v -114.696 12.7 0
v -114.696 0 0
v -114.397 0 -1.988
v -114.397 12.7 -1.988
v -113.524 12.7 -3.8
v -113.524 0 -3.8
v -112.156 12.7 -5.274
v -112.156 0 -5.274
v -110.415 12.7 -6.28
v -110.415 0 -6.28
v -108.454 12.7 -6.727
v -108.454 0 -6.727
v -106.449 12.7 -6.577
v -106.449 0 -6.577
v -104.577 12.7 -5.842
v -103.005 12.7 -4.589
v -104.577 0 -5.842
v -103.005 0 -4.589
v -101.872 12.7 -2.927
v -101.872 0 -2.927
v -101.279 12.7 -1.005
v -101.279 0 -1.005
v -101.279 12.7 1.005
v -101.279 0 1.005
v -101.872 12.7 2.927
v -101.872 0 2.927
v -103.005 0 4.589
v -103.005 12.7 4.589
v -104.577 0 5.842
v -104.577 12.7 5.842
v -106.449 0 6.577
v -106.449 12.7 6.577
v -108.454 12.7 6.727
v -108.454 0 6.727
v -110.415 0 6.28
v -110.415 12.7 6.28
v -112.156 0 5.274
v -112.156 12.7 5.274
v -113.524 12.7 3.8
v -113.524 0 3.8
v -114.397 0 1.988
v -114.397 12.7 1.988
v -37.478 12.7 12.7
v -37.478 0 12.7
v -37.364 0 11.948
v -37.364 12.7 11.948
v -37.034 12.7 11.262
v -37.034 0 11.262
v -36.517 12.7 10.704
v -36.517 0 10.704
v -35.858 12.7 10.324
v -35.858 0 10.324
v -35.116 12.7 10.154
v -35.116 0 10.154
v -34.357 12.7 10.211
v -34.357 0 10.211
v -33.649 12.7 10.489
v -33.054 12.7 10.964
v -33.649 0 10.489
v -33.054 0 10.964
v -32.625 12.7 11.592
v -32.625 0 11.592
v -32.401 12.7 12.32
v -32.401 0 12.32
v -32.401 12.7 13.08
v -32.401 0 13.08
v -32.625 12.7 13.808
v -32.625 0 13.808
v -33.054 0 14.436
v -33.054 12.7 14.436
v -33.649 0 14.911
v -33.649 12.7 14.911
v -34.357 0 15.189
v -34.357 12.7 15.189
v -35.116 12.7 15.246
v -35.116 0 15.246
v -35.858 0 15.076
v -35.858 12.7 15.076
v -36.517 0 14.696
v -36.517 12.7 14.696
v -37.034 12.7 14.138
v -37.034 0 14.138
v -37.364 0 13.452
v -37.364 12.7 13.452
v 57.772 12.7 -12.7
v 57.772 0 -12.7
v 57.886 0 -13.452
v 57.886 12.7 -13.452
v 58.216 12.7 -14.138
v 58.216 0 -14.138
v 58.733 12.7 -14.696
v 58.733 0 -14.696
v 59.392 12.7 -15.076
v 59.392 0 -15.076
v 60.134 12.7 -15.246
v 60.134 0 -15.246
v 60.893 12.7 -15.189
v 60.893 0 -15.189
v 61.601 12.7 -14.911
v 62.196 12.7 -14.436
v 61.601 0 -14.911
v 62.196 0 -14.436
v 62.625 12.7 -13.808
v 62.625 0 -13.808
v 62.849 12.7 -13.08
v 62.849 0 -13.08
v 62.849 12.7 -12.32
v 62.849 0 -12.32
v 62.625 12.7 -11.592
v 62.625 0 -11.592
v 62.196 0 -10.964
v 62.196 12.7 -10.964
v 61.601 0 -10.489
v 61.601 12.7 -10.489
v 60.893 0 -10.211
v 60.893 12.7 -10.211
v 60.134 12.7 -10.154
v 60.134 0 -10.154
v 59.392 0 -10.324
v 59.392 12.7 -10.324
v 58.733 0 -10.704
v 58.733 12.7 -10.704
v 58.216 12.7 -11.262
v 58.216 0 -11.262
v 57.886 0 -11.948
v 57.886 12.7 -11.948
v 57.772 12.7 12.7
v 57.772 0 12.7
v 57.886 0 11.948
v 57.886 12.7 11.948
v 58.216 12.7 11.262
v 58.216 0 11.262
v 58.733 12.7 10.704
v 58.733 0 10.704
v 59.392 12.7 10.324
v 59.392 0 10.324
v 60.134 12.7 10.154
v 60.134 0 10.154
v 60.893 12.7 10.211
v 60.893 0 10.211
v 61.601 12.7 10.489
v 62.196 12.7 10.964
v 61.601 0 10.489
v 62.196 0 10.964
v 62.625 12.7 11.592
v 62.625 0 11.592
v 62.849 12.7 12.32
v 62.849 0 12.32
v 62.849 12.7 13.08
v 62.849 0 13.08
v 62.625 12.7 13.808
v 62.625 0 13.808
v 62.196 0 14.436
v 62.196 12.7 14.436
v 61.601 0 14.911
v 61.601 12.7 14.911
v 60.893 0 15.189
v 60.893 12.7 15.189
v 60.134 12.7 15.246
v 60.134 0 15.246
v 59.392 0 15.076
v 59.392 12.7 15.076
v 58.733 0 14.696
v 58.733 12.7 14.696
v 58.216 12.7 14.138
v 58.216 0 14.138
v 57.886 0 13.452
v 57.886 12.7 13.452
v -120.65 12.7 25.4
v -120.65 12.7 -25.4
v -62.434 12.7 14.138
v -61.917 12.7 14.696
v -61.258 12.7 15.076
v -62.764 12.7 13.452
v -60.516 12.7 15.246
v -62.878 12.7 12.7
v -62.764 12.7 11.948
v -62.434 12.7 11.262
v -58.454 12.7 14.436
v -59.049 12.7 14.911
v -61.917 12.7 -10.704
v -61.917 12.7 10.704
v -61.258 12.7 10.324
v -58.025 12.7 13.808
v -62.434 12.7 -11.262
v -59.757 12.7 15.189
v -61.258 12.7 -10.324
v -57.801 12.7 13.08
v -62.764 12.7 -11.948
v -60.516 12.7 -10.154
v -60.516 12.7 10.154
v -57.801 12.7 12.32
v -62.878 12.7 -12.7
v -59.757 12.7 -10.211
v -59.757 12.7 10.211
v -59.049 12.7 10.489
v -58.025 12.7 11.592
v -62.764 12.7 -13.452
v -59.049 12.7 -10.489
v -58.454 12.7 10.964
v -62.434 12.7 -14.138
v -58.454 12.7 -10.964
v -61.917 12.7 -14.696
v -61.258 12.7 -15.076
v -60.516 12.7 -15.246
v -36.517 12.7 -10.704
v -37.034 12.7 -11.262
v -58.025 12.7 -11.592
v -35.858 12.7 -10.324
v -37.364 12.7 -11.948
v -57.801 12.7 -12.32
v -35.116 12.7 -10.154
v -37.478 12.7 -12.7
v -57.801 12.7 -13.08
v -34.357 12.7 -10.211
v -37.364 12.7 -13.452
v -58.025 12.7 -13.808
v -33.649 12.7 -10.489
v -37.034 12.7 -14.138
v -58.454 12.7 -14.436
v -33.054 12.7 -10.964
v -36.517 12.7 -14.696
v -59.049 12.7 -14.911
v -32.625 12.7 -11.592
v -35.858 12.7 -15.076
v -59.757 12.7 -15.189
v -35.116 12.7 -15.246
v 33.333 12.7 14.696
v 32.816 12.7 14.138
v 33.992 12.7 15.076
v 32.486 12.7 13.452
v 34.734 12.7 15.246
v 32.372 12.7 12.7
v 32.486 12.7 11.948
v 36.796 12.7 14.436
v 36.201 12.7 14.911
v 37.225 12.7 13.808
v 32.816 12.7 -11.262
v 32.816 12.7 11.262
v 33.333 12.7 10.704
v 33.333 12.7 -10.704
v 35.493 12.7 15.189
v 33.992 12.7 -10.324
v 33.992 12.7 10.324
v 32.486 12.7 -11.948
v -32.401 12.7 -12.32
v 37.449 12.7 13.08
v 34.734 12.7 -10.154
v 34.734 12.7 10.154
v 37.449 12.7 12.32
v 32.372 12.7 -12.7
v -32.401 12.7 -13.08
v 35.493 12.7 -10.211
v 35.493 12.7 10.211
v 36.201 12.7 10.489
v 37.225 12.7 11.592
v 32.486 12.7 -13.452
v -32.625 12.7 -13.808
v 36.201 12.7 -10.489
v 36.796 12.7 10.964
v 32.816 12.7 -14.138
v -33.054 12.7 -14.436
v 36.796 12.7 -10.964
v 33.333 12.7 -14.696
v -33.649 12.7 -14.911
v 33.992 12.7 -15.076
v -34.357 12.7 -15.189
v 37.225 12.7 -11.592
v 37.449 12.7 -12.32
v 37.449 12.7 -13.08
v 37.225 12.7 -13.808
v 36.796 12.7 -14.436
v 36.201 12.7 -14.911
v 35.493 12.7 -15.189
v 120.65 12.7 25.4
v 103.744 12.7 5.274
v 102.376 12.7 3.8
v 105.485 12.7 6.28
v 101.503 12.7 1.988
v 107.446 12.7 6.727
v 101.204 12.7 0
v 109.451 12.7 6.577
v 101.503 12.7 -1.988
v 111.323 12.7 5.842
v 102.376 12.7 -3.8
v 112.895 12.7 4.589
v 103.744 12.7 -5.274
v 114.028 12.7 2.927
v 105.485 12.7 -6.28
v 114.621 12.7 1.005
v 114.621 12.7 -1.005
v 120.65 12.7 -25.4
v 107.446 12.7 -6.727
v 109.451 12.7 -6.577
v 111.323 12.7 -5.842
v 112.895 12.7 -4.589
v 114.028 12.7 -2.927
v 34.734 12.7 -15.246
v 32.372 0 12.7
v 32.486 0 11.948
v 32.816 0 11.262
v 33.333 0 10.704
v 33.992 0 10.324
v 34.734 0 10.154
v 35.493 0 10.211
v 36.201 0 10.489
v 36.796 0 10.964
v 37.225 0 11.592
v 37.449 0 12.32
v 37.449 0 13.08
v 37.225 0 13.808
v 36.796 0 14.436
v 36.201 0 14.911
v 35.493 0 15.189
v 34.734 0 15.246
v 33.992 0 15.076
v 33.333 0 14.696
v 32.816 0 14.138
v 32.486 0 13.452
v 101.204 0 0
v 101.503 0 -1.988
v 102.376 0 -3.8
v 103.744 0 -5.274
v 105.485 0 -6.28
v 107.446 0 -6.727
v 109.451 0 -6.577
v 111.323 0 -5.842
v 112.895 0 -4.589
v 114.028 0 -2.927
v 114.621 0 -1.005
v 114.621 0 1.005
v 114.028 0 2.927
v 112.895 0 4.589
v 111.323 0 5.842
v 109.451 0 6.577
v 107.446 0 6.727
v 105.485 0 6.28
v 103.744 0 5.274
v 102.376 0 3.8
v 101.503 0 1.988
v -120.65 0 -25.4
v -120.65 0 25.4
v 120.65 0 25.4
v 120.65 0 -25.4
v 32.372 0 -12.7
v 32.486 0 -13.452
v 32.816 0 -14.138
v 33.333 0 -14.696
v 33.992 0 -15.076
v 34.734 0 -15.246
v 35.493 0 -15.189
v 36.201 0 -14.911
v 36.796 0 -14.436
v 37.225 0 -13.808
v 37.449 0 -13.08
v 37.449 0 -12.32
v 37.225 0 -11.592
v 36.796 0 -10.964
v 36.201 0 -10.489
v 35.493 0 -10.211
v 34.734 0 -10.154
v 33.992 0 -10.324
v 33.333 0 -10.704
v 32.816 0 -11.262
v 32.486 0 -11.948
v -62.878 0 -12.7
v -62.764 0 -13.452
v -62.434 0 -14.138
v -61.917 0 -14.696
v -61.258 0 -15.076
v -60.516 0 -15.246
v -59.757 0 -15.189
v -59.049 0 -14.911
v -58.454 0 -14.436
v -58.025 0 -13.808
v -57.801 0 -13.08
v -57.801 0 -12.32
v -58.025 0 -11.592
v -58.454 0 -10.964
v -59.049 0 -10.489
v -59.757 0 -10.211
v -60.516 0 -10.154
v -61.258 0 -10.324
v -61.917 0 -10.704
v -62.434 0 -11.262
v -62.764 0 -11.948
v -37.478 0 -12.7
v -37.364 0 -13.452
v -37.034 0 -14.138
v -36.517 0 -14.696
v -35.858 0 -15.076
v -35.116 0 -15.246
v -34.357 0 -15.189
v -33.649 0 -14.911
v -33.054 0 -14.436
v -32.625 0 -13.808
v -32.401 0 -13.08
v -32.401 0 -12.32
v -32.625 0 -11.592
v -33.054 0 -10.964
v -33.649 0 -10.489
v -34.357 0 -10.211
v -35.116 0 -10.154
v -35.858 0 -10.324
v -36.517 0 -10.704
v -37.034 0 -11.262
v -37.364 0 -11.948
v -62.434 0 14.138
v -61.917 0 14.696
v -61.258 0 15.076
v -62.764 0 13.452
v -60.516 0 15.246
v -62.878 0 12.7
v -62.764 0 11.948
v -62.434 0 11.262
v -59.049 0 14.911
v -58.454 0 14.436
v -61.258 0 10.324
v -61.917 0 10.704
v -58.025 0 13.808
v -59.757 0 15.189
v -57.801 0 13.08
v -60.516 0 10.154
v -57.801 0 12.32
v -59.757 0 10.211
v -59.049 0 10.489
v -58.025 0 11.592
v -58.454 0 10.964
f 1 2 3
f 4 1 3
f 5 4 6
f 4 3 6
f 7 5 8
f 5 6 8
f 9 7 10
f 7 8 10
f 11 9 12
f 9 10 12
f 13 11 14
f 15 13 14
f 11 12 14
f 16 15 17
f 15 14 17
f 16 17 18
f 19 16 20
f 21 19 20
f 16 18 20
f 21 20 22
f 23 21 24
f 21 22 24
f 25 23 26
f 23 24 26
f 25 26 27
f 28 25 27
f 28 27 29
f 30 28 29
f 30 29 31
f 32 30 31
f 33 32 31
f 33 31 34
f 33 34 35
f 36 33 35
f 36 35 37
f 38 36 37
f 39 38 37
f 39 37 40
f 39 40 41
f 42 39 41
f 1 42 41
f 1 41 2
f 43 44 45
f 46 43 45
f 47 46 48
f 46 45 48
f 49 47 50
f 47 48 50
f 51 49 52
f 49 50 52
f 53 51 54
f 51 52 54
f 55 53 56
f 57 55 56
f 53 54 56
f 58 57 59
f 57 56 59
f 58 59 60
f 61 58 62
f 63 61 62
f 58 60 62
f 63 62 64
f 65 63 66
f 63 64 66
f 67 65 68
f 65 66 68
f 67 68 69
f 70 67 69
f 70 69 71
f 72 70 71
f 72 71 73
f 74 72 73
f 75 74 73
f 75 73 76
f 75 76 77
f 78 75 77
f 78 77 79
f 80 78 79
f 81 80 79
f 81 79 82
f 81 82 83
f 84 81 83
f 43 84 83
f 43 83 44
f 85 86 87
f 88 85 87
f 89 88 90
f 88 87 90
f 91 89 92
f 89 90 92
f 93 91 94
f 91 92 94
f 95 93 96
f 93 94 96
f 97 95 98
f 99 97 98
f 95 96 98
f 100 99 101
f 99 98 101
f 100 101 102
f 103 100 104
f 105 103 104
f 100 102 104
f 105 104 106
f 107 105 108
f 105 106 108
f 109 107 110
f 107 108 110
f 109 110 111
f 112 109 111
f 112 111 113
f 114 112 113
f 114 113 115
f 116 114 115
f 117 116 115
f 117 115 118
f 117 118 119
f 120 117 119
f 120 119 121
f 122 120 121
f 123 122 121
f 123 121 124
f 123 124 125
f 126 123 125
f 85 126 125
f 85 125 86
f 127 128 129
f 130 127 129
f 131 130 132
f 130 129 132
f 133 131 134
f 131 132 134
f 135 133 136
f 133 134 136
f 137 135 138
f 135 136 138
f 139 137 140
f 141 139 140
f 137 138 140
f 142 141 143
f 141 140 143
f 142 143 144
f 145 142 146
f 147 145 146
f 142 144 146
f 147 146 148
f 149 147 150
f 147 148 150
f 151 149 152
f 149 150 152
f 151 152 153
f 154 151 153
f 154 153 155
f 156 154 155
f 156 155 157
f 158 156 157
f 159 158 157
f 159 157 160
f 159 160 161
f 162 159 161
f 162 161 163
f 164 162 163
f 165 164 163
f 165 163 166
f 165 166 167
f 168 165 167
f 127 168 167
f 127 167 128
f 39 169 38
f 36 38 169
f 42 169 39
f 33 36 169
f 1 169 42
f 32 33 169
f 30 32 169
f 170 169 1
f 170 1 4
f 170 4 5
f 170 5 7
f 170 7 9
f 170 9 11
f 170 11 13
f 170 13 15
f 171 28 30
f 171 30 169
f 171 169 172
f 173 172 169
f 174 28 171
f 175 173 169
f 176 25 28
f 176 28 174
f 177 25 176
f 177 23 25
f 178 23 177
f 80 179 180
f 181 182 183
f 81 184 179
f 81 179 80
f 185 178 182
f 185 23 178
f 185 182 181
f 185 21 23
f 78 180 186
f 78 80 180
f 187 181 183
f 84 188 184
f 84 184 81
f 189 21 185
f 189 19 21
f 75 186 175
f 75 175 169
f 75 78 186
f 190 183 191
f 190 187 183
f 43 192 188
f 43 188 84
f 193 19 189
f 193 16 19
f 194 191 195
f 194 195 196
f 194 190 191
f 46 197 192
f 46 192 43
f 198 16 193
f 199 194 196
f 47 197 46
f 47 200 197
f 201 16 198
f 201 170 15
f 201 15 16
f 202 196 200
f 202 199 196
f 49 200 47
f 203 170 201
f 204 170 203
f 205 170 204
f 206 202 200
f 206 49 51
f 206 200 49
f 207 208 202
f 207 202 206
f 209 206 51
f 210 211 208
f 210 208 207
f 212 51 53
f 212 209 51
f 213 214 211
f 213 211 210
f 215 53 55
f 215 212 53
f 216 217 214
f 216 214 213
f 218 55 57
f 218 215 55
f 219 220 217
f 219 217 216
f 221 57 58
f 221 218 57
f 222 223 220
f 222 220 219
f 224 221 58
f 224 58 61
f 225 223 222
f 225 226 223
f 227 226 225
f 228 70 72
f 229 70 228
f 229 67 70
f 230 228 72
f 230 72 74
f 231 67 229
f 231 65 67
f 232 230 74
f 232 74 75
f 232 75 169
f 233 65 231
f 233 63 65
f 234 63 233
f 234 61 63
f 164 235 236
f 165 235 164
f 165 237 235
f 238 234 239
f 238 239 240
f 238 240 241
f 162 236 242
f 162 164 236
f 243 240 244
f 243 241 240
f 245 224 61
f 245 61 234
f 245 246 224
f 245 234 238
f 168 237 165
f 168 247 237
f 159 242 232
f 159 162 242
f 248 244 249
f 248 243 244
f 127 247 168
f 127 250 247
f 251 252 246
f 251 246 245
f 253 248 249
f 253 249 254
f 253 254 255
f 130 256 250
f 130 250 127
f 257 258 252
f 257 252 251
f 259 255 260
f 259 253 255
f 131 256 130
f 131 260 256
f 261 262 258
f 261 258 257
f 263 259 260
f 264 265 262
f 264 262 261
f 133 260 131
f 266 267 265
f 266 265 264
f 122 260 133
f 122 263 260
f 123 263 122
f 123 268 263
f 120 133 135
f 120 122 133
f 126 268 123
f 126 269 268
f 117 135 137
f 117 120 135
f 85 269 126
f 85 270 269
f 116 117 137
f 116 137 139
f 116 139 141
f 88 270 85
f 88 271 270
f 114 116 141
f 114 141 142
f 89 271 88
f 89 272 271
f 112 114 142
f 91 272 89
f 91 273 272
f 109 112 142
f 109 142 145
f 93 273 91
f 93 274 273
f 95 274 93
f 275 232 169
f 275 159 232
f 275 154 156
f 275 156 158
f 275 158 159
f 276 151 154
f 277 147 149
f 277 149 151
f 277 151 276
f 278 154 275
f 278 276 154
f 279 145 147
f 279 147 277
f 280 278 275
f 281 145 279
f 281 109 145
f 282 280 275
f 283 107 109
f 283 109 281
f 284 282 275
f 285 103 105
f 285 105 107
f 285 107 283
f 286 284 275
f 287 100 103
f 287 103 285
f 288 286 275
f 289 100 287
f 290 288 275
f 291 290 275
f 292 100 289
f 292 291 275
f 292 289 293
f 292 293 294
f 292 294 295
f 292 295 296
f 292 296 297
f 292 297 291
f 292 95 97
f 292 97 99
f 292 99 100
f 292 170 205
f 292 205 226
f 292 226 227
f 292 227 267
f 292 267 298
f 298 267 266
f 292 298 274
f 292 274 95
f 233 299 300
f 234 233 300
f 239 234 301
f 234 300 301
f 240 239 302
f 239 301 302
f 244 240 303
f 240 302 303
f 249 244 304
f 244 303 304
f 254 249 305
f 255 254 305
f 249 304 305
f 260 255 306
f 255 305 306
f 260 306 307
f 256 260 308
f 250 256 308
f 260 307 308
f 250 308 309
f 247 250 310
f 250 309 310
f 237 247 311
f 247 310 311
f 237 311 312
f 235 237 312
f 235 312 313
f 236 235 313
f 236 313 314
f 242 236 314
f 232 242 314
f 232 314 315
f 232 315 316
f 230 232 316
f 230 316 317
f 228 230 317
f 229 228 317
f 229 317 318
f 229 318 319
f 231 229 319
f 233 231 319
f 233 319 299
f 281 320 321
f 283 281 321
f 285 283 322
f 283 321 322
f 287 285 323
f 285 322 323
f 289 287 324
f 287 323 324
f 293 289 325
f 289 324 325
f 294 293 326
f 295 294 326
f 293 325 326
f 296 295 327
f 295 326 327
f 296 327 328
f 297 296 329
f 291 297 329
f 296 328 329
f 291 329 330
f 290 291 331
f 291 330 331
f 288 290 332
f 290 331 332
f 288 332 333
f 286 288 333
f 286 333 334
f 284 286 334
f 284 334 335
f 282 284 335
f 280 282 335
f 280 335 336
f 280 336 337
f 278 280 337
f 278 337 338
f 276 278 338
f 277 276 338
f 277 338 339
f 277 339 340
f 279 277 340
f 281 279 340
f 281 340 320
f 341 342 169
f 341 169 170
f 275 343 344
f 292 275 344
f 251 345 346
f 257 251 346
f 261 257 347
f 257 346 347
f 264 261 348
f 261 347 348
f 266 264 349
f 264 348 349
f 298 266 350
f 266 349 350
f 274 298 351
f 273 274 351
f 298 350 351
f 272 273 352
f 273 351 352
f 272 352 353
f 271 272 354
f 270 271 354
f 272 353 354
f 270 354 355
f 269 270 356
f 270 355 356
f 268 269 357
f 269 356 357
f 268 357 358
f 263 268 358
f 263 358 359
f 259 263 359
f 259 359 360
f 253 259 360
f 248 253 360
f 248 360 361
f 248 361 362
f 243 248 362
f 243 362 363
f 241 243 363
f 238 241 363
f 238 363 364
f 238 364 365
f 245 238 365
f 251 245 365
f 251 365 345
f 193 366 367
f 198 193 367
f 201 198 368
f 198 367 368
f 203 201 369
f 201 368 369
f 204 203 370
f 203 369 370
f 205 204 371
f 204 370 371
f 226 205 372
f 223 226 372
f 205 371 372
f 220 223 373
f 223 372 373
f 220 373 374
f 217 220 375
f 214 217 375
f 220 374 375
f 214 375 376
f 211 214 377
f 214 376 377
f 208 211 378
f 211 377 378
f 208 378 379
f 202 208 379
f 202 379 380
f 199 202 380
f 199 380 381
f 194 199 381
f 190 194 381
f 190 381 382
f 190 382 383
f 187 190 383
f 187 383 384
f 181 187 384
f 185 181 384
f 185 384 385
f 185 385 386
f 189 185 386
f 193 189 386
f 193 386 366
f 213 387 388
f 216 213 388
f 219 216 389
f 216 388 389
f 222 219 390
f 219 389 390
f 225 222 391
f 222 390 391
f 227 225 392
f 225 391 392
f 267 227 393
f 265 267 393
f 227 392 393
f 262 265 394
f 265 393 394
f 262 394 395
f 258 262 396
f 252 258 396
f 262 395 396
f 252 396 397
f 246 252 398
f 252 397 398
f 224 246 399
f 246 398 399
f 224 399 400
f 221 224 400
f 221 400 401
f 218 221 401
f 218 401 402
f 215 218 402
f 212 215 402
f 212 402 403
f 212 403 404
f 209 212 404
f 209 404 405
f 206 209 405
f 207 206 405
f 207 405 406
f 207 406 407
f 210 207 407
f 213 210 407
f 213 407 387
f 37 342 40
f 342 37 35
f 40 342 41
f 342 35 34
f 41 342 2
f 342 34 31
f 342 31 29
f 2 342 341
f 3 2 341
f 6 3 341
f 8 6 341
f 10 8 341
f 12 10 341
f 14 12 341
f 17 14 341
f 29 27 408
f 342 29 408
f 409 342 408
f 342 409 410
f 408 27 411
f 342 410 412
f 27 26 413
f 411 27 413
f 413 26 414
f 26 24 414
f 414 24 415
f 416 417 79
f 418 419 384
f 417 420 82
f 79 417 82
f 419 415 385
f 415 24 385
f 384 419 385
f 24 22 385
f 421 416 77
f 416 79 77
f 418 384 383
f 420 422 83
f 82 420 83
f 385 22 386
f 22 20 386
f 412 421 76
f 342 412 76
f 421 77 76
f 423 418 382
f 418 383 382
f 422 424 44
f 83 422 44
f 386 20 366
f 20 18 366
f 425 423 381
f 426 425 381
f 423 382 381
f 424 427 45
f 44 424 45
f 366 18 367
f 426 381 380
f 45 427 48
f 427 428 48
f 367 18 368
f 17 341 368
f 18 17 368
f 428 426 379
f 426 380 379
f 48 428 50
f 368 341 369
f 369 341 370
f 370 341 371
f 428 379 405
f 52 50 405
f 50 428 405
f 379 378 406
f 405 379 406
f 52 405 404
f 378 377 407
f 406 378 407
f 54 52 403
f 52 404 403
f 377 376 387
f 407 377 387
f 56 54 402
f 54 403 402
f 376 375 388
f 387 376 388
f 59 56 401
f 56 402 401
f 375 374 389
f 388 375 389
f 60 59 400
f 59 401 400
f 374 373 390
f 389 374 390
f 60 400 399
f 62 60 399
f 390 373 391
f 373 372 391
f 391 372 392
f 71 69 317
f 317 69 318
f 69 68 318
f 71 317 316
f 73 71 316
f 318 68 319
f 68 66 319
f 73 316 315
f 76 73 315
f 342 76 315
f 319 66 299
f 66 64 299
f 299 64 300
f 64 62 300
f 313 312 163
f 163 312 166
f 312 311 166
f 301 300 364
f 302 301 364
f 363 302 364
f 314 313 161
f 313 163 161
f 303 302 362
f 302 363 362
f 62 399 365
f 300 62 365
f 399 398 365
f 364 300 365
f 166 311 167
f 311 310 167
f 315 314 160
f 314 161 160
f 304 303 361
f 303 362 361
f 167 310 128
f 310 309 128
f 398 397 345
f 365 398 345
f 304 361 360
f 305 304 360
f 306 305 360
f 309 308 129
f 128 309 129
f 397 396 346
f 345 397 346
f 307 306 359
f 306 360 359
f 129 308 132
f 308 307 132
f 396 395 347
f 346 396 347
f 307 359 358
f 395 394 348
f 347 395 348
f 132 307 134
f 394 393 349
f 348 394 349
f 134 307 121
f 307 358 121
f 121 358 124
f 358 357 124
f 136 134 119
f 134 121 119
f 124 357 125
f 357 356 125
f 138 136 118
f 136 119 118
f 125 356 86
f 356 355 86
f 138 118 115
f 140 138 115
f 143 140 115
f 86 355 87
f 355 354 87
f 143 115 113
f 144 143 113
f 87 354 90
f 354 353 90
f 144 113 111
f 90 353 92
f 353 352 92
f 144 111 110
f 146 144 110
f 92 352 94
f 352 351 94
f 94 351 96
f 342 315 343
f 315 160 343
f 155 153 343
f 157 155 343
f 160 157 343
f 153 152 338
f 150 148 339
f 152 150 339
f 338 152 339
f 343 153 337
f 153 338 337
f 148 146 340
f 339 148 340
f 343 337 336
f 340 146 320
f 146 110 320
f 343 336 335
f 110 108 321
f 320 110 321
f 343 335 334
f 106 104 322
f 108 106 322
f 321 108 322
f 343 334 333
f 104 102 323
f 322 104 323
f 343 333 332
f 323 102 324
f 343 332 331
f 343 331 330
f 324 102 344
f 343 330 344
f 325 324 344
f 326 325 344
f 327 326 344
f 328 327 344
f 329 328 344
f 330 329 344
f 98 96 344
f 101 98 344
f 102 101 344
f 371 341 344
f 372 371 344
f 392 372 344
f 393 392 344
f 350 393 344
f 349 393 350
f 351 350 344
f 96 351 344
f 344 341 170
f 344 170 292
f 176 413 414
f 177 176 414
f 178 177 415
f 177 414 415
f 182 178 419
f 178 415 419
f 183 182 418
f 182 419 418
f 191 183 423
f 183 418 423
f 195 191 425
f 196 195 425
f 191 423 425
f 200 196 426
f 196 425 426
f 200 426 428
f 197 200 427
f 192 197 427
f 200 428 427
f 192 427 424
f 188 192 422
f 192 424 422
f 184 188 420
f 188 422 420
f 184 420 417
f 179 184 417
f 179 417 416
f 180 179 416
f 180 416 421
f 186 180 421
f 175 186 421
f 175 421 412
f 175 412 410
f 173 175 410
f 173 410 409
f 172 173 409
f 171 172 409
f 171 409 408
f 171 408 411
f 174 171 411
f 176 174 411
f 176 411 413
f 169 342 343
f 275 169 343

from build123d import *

# Parameters (mm, degrees)
SKETCH1_W               = 241.3
SKETCH1_H               = 50.8
BOSS_EXTRUDE1_DEPTH     = 12.7
F_1_4_20_TAPPED_HOLE2_D = 5.1054
F_1_2_CLEARANCE_HOLE1_D = 13.49248


with BuildPart() as part:
    # Sketch1 → Boss-Extrude1 (new body)
    with BuildSketch(Plane(origin=(0, 0, 0), x_dir=(1, 0, 0), z_dir=(0, 1, 0))):
        Rectangle(SKETCH1_W, SKETCH1_H)
    extrude(amount=BOSS_EXTRUDE1_DEPTH)

    # 1/4-20 Tapped Hole2 (through all)
    with Locations(Plane(origin=(0, 12.7, 0), x_dir=(1, 0, 0), z_dir=(0, 1, 0))):
        with Locations((60.325, -12.7), (-34.925, -12.7), (-60.325, -12.7), (-60.325, 12.7), (-34.925, 12.7), (34.925, 12.7), (60.325, 12.7), (34.925, -12.7)):
            Hole(F_1_4_20_TAPPED_HOLE2_D / 2)

    # 1/2 Clearance Hole1 (through all)
    with Locations(Plane(origin=(0, 12.7, 0), x_dir=(1, 0, 0), z_dir=(0, 1, 0))):
        with Locations((-107.95, 0), (107.95, 0)):
            Hole(F_1_2_CLEARANCE_HOLE1_D / 2)


solid = part.part
